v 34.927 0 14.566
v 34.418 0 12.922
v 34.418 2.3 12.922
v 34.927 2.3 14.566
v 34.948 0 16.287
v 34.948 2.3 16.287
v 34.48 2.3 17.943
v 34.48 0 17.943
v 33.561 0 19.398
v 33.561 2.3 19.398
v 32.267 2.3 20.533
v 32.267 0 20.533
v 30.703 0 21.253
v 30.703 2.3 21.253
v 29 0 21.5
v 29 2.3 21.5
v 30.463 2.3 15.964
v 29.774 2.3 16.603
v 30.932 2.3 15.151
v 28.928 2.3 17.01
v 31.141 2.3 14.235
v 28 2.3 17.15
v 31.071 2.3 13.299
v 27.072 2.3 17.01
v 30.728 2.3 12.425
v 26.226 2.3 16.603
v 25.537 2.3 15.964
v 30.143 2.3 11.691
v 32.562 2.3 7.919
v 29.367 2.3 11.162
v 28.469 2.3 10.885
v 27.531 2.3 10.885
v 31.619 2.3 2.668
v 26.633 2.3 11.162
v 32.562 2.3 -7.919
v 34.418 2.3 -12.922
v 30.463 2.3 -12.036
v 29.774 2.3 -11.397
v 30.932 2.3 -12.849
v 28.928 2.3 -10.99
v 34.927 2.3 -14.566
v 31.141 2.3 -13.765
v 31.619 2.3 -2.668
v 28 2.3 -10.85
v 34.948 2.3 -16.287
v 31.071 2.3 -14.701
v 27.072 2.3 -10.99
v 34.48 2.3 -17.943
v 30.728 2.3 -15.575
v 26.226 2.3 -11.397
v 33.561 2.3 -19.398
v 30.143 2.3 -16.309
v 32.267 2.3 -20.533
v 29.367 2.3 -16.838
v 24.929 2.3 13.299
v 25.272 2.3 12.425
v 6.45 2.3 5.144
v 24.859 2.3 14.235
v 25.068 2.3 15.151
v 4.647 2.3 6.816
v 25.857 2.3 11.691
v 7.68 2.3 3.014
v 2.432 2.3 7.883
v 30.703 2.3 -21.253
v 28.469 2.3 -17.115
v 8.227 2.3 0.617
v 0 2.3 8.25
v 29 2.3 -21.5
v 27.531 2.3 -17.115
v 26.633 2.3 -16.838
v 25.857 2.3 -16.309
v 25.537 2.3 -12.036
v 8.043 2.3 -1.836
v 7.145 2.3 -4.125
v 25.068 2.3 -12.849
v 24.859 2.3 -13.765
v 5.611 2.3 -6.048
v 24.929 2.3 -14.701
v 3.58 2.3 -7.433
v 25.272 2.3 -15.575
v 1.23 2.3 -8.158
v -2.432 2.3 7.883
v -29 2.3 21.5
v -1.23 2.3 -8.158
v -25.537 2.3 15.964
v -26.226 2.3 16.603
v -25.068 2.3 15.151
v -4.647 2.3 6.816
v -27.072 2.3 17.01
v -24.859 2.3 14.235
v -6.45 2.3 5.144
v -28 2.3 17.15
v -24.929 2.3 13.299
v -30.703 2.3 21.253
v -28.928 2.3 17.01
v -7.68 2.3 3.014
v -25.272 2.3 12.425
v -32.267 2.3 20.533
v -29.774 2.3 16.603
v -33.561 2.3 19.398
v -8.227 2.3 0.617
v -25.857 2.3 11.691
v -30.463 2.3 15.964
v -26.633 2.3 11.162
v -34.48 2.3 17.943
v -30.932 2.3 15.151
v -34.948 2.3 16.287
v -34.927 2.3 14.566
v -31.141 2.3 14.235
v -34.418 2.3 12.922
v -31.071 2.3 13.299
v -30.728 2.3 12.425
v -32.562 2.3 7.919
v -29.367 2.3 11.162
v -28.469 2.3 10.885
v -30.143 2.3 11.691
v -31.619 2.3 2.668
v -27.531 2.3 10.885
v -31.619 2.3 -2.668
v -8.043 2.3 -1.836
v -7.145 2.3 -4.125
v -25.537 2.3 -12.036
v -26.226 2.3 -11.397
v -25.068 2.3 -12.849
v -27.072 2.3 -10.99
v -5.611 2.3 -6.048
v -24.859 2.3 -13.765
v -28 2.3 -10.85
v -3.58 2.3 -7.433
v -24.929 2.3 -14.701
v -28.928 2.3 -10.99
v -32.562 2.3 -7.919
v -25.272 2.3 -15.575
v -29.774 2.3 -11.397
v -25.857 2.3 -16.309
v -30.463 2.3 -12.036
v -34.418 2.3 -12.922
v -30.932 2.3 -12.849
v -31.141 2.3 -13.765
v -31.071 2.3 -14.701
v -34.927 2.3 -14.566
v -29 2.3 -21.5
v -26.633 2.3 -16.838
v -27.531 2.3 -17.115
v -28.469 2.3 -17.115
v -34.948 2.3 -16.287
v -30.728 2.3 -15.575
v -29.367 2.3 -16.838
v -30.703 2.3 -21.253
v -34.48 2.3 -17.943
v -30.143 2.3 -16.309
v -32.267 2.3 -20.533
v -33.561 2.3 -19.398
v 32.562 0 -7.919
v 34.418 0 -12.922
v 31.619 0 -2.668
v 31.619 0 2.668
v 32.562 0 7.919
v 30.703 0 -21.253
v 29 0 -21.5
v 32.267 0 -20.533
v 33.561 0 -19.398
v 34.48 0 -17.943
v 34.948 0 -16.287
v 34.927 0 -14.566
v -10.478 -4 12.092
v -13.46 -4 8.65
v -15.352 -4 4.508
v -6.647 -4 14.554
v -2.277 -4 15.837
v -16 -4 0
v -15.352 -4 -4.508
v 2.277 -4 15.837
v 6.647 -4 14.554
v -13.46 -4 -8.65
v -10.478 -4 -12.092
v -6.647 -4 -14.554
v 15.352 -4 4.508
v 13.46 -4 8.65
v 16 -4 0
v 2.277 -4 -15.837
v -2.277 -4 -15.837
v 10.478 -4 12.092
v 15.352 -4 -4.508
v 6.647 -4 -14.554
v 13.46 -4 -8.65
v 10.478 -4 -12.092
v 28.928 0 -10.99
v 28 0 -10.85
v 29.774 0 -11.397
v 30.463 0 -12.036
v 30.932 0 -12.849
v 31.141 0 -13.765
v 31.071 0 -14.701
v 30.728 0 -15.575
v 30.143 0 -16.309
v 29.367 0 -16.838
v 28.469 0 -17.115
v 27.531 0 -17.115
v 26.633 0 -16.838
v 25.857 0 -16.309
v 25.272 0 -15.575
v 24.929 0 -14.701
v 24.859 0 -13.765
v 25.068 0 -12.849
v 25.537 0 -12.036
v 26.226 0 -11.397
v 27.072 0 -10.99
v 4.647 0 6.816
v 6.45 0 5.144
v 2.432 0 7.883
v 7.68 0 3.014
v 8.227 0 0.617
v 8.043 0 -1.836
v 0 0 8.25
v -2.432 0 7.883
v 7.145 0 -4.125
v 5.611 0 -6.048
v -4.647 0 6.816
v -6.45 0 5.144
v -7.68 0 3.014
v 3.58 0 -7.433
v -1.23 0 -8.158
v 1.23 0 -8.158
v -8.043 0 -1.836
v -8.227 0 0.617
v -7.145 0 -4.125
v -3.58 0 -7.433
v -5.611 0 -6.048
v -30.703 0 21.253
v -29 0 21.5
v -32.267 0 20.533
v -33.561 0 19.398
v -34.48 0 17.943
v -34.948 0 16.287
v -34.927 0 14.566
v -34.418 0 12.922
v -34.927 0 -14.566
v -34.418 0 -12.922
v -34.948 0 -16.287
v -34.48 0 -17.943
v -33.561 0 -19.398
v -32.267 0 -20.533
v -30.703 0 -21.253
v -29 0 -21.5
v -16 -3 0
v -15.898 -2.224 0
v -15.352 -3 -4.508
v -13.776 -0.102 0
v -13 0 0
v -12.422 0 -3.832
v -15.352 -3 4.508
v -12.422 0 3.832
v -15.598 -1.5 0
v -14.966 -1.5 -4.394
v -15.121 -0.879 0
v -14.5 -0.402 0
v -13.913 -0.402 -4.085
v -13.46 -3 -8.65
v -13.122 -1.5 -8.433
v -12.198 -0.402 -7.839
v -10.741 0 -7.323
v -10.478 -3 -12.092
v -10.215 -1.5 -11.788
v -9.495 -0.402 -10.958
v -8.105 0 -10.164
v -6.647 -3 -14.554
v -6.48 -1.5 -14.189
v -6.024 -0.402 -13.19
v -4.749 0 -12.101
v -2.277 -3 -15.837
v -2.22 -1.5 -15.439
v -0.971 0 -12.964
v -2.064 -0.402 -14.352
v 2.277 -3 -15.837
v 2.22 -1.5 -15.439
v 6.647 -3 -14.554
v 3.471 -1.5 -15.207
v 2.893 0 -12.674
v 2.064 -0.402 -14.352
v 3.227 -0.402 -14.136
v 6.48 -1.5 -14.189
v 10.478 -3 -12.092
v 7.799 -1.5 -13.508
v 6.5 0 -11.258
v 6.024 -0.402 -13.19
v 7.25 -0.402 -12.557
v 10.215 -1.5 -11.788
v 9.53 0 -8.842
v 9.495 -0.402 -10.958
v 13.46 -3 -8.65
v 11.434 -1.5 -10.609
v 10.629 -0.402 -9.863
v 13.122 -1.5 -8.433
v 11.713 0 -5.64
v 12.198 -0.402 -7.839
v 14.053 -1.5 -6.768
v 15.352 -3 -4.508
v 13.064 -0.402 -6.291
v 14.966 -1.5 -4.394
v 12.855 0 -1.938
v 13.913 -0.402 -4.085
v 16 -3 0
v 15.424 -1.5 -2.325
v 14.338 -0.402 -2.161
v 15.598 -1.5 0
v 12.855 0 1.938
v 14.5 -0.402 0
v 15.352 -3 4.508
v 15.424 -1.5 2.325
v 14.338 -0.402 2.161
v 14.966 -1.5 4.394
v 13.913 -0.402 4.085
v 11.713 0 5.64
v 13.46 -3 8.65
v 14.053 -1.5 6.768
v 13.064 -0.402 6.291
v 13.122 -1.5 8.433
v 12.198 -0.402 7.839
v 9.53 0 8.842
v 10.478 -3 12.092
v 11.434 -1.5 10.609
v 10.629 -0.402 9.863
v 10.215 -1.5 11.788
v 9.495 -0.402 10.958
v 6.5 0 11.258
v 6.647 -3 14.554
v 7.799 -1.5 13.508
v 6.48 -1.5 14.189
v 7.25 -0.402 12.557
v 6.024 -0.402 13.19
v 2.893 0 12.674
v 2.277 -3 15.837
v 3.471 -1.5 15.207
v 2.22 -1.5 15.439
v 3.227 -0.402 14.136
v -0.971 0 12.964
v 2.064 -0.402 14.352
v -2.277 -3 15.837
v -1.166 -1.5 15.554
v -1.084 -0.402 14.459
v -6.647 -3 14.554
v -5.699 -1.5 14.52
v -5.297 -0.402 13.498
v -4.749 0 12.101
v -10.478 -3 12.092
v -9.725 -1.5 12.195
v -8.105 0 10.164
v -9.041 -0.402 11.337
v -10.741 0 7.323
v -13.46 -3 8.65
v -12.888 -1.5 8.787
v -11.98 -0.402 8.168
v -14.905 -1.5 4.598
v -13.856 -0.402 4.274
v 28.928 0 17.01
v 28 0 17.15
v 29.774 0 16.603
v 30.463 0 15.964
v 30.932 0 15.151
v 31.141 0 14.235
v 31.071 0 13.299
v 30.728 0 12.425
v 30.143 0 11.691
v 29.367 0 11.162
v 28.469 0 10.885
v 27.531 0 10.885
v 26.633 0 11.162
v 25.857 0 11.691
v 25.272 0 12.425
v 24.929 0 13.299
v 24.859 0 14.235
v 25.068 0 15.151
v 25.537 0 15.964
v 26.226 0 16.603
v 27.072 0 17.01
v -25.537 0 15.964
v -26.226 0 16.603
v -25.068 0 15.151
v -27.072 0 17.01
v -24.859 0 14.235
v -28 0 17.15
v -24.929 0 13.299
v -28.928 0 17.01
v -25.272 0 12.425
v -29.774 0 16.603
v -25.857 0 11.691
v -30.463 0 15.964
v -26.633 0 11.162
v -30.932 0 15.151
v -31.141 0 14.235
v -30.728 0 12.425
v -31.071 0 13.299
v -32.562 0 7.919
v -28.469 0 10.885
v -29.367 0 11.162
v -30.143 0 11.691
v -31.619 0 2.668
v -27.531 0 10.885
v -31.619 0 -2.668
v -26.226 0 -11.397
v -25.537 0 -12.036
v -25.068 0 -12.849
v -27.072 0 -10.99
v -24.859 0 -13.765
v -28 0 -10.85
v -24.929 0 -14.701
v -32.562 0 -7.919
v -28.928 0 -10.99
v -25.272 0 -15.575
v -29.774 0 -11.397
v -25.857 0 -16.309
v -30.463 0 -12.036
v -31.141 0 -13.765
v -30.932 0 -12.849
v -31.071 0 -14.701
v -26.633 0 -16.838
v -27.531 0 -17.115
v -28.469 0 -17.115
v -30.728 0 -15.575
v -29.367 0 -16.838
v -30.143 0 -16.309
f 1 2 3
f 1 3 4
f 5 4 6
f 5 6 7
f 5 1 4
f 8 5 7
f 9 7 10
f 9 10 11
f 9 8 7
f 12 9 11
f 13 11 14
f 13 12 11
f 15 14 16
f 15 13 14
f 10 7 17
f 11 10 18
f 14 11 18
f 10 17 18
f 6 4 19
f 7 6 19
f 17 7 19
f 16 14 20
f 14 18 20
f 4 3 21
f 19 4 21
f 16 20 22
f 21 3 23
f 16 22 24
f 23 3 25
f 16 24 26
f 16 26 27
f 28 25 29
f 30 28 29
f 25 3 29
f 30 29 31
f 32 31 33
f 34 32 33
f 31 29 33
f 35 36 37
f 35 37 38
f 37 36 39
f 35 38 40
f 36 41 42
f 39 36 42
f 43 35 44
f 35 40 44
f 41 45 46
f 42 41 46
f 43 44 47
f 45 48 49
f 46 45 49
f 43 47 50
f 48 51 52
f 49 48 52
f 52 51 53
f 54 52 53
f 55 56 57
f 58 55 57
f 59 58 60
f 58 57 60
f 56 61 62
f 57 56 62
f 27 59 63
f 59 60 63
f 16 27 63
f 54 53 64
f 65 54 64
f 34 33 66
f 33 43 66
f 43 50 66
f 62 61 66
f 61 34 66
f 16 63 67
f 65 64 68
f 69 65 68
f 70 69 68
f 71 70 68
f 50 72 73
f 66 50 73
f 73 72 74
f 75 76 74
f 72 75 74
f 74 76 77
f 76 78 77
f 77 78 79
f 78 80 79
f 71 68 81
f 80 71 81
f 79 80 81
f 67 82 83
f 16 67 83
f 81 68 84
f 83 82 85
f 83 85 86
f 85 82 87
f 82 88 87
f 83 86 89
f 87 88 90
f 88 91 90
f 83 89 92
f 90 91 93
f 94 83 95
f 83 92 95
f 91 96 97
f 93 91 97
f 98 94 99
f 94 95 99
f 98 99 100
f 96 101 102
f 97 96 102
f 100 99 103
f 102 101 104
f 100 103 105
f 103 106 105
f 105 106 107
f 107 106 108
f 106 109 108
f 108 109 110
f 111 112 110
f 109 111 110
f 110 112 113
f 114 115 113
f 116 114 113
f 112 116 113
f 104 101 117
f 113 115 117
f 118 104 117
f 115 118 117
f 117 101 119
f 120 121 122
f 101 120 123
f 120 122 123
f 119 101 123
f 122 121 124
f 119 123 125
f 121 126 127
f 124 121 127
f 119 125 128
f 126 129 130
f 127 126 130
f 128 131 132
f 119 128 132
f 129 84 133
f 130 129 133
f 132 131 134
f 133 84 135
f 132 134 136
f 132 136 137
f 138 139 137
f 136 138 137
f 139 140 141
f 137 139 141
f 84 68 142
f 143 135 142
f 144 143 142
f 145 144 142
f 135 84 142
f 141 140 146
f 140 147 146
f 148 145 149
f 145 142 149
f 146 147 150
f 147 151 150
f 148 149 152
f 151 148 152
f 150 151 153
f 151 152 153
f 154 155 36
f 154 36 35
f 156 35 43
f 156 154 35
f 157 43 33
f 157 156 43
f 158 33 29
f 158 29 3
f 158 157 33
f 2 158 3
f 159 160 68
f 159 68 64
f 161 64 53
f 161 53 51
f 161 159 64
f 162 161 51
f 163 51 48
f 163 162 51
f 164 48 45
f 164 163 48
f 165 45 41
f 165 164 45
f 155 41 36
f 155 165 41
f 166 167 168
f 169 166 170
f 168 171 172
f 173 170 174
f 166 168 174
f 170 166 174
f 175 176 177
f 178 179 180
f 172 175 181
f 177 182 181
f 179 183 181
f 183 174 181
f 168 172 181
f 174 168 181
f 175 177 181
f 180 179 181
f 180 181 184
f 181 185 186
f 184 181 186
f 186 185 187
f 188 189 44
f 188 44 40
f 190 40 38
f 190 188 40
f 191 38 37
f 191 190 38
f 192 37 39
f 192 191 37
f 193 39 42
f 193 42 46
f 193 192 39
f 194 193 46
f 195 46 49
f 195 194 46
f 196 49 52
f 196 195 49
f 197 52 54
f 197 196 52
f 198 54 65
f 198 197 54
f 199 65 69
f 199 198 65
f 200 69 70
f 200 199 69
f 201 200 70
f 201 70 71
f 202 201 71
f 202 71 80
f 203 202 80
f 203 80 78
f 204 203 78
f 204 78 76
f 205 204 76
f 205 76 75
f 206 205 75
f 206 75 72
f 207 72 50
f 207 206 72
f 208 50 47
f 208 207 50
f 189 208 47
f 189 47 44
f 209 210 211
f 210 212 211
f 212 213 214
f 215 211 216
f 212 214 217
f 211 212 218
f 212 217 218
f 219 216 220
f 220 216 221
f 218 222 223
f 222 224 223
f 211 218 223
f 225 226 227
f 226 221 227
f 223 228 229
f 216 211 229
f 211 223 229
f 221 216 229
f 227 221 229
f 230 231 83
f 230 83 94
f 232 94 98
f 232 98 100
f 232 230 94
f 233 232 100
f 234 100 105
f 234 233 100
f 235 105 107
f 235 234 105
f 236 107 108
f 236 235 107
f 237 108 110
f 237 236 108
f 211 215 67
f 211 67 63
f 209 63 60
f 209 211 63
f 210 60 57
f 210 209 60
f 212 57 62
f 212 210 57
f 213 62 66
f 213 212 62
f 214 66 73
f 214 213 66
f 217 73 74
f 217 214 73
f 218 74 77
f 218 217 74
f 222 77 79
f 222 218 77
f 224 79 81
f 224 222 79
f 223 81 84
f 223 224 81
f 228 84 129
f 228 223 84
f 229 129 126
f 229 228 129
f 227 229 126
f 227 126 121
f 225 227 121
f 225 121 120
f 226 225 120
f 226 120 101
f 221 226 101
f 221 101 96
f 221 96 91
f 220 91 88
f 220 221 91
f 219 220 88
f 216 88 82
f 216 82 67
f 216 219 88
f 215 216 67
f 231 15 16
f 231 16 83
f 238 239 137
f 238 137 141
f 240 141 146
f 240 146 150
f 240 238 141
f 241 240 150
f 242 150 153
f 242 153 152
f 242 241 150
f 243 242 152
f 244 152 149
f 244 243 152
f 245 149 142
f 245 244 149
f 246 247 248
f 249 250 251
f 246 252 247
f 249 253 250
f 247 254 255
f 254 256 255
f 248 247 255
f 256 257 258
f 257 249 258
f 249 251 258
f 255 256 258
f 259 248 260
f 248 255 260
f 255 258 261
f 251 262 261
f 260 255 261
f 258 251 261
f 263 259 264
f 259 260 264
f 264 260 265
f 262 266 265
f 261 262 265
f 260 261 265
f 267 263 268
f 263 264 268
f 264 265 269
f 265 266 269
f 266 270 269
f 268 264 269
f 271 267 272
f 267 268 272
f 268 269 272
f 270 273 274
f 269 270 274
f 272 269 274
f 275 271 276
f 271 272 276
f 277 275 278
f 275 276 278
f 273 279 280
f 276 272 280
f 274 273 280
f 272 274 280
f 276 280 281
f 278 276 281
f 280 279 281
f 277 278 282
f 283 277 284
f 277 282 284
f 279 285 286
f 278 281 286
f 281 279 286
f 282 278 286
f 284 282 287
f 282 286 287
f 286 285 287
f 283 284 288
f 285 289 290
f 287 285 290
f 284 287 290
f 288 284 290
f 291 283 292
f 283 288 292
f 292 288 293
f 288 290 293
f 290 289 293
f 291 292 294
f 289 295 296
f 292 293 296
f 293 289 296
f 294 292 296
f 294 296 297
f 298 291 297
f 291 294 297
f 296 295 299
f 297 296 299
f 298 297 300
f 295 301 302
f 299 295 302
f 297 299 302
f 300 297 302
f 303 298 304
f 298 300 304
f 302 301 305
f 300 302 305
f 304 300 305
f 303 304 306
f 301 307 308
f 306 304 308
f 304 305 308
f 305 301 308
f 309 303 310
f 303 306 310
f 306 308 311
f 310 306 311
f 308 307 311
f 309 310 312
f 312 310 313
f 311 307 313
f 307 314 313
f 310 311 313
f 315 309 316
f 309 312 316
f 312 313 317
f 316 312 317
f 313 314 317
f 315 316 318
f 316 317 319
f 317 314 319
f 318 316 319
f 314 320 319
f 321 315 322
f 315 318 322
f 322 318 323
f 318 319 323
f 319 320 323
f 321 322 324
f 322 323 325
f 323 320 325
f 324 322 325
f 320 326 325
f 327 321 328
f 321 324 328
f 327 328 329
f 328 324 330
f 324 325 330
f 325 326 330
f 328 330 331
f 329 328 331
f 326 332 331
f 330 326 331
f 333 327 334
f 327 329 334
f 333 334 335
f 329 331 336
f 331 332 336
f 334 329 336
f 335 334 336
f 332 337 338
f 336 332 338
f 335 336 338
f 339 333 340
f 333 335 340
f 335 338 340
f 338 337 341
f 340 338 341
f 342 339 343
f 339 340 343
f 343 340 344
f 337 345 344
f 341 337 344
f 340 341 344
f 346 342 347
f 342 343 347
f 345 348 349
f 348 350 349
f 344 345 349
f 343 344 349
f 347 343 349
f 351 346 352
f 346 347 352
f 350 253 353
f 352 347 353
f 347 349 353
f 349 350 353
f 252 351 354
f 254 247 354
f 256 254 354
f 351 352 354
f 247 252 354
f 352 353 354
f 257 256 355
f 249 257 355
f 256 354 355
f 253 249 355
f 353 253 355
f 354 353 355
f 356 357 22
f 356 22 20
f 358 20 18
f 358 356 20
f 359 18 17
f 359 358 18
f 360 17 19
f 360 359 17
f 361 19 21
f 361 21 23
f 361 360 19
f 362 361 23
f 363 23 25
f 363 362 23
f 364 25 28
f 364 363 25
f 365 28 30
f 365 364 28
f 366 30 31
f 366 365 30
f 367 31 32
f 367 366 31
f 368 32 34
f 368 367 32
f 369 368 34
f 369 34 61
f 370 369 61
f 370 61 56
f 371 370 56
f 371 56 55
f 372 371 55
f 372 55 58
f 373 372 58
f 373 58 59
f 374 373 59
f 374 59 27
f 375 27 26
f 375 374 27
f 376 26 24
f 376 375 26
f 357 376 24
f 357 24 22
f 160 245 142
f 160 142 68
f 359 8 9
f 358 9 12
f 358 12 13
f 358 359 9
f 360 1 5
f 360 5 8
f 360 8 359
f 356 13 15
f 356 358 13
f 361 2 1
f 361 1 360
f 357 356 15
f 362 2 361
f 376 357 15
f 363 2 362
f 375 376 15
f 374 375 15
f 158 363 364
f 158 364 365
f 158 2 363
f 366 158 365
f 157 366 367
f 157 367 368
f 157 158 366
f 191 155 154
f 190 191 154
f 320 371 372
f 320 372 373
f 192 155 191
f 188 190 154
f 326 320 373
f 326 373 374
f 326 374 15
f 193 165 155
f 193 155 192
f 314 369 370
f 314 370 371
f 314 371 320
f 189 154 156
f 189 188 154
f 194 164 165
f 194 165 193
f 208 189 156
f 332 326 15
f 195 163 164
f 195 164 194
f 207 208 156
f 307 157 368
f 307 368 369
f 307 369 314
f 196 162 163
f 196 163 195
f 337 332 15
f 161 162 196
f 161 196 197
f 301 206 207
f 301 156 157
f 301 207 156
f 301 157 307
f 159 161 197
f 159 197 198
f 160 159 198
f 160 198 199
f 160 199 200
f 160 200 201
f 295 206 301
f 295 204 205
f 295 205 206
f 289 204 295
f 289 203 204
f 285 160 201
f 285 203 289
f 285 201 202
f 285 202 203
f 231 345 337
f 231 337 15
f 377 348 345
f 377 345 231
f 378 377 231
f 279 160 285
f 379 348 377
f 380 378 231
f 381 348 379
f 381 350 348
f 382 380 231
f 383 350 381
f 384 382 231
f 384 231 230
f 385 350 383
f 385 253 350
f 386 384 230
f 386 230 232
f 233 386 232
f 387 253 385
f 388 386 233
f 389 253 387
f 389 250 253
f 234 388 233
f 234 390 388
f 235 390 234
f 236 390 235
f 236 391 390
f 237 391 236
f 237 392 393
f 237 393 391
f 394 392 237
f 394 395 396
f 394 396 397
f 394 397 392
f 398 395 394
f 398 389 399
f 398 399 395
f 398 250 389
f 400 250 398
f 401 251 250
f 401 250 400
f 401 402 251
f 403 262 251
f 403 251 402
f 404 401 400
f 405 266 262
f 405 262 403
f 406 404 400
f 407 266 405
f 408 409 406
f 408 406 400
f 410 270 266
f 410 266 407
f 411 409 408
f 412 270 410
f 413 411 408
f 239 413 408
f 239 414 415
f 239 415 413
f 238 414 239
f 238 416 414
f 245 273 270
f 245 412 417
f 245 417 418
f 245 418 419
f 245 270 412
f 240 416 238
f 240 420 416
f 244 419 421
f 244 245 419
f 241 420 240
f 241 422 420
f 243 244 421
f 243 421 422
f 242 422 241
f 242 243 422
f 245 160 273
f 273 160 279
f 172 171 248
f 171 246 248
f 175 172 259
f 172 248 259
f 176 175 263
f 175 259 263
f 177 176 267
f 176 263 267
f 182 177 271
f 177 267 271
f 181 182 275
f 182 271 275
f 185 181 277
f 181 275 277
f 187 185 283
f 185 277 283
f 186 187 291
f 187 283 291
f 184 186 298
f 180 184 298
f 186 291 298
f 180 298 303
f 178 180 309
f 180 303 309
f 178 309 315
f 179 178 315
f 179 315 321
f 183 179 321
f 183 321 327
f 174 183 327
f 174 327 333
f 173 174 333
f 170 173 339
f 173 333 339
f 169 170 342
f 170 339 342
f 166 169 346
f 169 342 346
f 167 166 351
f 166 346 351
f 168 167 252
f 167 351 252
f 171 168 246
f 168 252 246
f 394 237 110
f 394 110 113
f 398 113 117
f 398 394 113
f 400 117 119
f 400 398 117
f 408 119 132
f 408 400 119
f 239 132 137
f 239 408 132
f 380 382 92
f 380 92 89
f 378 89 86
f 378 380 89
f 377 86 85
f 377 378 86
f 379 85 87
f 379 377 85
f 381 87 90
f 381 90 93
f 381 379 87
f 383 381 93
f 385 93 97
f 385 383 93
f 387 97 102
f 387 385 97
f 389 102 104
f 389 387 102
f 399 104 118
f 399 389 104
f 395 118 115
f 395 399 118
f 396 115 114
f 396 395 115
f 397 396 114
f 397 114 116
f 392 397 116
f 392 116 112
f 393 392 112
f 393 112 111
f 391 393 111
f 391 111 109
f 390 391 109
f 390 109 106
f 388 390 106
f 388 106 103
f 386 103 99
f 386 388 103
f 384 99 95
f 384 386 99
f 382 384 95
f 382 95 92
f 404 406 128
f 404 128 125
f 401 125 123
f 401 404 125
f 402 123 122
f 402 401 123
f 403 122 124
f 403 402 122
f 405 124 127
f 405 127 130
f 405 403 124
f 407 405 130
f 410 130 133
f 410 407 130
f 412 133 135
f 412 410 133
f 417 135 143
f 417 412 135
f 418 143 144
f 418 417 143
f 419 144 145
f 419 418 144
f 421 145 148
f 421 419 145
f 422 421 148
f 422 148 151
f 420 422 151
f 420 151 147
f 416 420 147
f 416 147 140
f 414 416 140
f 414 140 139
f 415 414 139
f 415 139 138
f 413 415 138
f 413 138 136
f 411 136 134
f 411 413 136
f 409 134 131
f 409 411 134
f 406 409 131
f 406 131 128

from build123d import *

# Parameters (mm, degrees)
SKETCH_2_R      = 3.15
SKETCH_2_R_2    = 8.25
EXTRUDE_1_DEPTH = 2.3


with BuildPart() as part:
    # ｽｹｯﾁ2 → ﾎﾞｽ - 押し出し1 (new body)
    with BuildSketch(Plane(origin=(0, 0, 0), x_dir=(1, 0, 0), z_dir=(0, 1, 0))):
        with BuildLine():
            Line((-29, 21.5), (29, 21.5))
            ThreePointArc((29, 21.5), (34.072933408, 18.703957965), (34.417821799, 12.921782213))
            ThreePointArc((34.417821799, 12.921782213), (31.500000042, 0), (34.417821799, -12.921782213))
            ThreePointArc((34.417821799, -12.921782213), (34.072933408, -18.703957965), (29, -21.5))
            Line((29, -21.5), (-29, -21.5))
            ThreePointArc((-29, -21.5), (-34.072933408, -18.703957965), (-34.417821799, -12.921782213))
            ThreePointArc((-34.417821799, -12.921782213), (-31.499999945, 0), (-34.417821799, 12.921782213))
            ThreePointArc((-34.417821799, 12.921782213), (-34.072933408, 18.703957965), (-29, 21.5))
        make_face()
        with Locations(Location((28, 14, 0), (0, 0, 270))):
            Circle(SKETCH_2_R, mode=Mode.SUBTRACT)
        with Locations(Location((28, -14, 0), (0, 0, 270))):
            Circle(SKETCH_2_R, mode=Mode.SUBTRACT)
        with Locations(Location((-28, 14, 0), (0, 0, 270))):
            Circle(SKETCH_2_R, mode=Mode.SUBTRACT)
        with Locations(Location((-28, -14, 0), (0, 0, 270))):
            Circle(SKETCH_2_R, mode=Mode.SUBTRACT)
        with Locations(Location((0, 0, 0), (0, 0, 270))):
            Circle(SKETCH_2_R_2, mode=Mode.SUBTRACT)
    extrude(amount=EXTRUDE_1_DEPTH)

    # ｽｹｯﾁ4 → 回転1 (revolve)
    with BuildSketch(Plane.XY, mode=Mode.PRIVATE) as revolve_1_sk:
        with BuildLine():
            Line((13, 0), (0, 0))
            Line((0, 0), (0, -4))
            Line((0, -4), (16, -4))
            Line((16, -4), (16, -3))
            ThreePointArc((16, -3), (15.121320344, -0.878679656), (13, 0))
        make_face()
    revolve(revolve_1_sk.sketch.rotate(Axis((0, 0, 0), (0, -1, 0)), 180), axis=Axis((0, 0, 0), (0, -1, 0)))


solid = part.part
